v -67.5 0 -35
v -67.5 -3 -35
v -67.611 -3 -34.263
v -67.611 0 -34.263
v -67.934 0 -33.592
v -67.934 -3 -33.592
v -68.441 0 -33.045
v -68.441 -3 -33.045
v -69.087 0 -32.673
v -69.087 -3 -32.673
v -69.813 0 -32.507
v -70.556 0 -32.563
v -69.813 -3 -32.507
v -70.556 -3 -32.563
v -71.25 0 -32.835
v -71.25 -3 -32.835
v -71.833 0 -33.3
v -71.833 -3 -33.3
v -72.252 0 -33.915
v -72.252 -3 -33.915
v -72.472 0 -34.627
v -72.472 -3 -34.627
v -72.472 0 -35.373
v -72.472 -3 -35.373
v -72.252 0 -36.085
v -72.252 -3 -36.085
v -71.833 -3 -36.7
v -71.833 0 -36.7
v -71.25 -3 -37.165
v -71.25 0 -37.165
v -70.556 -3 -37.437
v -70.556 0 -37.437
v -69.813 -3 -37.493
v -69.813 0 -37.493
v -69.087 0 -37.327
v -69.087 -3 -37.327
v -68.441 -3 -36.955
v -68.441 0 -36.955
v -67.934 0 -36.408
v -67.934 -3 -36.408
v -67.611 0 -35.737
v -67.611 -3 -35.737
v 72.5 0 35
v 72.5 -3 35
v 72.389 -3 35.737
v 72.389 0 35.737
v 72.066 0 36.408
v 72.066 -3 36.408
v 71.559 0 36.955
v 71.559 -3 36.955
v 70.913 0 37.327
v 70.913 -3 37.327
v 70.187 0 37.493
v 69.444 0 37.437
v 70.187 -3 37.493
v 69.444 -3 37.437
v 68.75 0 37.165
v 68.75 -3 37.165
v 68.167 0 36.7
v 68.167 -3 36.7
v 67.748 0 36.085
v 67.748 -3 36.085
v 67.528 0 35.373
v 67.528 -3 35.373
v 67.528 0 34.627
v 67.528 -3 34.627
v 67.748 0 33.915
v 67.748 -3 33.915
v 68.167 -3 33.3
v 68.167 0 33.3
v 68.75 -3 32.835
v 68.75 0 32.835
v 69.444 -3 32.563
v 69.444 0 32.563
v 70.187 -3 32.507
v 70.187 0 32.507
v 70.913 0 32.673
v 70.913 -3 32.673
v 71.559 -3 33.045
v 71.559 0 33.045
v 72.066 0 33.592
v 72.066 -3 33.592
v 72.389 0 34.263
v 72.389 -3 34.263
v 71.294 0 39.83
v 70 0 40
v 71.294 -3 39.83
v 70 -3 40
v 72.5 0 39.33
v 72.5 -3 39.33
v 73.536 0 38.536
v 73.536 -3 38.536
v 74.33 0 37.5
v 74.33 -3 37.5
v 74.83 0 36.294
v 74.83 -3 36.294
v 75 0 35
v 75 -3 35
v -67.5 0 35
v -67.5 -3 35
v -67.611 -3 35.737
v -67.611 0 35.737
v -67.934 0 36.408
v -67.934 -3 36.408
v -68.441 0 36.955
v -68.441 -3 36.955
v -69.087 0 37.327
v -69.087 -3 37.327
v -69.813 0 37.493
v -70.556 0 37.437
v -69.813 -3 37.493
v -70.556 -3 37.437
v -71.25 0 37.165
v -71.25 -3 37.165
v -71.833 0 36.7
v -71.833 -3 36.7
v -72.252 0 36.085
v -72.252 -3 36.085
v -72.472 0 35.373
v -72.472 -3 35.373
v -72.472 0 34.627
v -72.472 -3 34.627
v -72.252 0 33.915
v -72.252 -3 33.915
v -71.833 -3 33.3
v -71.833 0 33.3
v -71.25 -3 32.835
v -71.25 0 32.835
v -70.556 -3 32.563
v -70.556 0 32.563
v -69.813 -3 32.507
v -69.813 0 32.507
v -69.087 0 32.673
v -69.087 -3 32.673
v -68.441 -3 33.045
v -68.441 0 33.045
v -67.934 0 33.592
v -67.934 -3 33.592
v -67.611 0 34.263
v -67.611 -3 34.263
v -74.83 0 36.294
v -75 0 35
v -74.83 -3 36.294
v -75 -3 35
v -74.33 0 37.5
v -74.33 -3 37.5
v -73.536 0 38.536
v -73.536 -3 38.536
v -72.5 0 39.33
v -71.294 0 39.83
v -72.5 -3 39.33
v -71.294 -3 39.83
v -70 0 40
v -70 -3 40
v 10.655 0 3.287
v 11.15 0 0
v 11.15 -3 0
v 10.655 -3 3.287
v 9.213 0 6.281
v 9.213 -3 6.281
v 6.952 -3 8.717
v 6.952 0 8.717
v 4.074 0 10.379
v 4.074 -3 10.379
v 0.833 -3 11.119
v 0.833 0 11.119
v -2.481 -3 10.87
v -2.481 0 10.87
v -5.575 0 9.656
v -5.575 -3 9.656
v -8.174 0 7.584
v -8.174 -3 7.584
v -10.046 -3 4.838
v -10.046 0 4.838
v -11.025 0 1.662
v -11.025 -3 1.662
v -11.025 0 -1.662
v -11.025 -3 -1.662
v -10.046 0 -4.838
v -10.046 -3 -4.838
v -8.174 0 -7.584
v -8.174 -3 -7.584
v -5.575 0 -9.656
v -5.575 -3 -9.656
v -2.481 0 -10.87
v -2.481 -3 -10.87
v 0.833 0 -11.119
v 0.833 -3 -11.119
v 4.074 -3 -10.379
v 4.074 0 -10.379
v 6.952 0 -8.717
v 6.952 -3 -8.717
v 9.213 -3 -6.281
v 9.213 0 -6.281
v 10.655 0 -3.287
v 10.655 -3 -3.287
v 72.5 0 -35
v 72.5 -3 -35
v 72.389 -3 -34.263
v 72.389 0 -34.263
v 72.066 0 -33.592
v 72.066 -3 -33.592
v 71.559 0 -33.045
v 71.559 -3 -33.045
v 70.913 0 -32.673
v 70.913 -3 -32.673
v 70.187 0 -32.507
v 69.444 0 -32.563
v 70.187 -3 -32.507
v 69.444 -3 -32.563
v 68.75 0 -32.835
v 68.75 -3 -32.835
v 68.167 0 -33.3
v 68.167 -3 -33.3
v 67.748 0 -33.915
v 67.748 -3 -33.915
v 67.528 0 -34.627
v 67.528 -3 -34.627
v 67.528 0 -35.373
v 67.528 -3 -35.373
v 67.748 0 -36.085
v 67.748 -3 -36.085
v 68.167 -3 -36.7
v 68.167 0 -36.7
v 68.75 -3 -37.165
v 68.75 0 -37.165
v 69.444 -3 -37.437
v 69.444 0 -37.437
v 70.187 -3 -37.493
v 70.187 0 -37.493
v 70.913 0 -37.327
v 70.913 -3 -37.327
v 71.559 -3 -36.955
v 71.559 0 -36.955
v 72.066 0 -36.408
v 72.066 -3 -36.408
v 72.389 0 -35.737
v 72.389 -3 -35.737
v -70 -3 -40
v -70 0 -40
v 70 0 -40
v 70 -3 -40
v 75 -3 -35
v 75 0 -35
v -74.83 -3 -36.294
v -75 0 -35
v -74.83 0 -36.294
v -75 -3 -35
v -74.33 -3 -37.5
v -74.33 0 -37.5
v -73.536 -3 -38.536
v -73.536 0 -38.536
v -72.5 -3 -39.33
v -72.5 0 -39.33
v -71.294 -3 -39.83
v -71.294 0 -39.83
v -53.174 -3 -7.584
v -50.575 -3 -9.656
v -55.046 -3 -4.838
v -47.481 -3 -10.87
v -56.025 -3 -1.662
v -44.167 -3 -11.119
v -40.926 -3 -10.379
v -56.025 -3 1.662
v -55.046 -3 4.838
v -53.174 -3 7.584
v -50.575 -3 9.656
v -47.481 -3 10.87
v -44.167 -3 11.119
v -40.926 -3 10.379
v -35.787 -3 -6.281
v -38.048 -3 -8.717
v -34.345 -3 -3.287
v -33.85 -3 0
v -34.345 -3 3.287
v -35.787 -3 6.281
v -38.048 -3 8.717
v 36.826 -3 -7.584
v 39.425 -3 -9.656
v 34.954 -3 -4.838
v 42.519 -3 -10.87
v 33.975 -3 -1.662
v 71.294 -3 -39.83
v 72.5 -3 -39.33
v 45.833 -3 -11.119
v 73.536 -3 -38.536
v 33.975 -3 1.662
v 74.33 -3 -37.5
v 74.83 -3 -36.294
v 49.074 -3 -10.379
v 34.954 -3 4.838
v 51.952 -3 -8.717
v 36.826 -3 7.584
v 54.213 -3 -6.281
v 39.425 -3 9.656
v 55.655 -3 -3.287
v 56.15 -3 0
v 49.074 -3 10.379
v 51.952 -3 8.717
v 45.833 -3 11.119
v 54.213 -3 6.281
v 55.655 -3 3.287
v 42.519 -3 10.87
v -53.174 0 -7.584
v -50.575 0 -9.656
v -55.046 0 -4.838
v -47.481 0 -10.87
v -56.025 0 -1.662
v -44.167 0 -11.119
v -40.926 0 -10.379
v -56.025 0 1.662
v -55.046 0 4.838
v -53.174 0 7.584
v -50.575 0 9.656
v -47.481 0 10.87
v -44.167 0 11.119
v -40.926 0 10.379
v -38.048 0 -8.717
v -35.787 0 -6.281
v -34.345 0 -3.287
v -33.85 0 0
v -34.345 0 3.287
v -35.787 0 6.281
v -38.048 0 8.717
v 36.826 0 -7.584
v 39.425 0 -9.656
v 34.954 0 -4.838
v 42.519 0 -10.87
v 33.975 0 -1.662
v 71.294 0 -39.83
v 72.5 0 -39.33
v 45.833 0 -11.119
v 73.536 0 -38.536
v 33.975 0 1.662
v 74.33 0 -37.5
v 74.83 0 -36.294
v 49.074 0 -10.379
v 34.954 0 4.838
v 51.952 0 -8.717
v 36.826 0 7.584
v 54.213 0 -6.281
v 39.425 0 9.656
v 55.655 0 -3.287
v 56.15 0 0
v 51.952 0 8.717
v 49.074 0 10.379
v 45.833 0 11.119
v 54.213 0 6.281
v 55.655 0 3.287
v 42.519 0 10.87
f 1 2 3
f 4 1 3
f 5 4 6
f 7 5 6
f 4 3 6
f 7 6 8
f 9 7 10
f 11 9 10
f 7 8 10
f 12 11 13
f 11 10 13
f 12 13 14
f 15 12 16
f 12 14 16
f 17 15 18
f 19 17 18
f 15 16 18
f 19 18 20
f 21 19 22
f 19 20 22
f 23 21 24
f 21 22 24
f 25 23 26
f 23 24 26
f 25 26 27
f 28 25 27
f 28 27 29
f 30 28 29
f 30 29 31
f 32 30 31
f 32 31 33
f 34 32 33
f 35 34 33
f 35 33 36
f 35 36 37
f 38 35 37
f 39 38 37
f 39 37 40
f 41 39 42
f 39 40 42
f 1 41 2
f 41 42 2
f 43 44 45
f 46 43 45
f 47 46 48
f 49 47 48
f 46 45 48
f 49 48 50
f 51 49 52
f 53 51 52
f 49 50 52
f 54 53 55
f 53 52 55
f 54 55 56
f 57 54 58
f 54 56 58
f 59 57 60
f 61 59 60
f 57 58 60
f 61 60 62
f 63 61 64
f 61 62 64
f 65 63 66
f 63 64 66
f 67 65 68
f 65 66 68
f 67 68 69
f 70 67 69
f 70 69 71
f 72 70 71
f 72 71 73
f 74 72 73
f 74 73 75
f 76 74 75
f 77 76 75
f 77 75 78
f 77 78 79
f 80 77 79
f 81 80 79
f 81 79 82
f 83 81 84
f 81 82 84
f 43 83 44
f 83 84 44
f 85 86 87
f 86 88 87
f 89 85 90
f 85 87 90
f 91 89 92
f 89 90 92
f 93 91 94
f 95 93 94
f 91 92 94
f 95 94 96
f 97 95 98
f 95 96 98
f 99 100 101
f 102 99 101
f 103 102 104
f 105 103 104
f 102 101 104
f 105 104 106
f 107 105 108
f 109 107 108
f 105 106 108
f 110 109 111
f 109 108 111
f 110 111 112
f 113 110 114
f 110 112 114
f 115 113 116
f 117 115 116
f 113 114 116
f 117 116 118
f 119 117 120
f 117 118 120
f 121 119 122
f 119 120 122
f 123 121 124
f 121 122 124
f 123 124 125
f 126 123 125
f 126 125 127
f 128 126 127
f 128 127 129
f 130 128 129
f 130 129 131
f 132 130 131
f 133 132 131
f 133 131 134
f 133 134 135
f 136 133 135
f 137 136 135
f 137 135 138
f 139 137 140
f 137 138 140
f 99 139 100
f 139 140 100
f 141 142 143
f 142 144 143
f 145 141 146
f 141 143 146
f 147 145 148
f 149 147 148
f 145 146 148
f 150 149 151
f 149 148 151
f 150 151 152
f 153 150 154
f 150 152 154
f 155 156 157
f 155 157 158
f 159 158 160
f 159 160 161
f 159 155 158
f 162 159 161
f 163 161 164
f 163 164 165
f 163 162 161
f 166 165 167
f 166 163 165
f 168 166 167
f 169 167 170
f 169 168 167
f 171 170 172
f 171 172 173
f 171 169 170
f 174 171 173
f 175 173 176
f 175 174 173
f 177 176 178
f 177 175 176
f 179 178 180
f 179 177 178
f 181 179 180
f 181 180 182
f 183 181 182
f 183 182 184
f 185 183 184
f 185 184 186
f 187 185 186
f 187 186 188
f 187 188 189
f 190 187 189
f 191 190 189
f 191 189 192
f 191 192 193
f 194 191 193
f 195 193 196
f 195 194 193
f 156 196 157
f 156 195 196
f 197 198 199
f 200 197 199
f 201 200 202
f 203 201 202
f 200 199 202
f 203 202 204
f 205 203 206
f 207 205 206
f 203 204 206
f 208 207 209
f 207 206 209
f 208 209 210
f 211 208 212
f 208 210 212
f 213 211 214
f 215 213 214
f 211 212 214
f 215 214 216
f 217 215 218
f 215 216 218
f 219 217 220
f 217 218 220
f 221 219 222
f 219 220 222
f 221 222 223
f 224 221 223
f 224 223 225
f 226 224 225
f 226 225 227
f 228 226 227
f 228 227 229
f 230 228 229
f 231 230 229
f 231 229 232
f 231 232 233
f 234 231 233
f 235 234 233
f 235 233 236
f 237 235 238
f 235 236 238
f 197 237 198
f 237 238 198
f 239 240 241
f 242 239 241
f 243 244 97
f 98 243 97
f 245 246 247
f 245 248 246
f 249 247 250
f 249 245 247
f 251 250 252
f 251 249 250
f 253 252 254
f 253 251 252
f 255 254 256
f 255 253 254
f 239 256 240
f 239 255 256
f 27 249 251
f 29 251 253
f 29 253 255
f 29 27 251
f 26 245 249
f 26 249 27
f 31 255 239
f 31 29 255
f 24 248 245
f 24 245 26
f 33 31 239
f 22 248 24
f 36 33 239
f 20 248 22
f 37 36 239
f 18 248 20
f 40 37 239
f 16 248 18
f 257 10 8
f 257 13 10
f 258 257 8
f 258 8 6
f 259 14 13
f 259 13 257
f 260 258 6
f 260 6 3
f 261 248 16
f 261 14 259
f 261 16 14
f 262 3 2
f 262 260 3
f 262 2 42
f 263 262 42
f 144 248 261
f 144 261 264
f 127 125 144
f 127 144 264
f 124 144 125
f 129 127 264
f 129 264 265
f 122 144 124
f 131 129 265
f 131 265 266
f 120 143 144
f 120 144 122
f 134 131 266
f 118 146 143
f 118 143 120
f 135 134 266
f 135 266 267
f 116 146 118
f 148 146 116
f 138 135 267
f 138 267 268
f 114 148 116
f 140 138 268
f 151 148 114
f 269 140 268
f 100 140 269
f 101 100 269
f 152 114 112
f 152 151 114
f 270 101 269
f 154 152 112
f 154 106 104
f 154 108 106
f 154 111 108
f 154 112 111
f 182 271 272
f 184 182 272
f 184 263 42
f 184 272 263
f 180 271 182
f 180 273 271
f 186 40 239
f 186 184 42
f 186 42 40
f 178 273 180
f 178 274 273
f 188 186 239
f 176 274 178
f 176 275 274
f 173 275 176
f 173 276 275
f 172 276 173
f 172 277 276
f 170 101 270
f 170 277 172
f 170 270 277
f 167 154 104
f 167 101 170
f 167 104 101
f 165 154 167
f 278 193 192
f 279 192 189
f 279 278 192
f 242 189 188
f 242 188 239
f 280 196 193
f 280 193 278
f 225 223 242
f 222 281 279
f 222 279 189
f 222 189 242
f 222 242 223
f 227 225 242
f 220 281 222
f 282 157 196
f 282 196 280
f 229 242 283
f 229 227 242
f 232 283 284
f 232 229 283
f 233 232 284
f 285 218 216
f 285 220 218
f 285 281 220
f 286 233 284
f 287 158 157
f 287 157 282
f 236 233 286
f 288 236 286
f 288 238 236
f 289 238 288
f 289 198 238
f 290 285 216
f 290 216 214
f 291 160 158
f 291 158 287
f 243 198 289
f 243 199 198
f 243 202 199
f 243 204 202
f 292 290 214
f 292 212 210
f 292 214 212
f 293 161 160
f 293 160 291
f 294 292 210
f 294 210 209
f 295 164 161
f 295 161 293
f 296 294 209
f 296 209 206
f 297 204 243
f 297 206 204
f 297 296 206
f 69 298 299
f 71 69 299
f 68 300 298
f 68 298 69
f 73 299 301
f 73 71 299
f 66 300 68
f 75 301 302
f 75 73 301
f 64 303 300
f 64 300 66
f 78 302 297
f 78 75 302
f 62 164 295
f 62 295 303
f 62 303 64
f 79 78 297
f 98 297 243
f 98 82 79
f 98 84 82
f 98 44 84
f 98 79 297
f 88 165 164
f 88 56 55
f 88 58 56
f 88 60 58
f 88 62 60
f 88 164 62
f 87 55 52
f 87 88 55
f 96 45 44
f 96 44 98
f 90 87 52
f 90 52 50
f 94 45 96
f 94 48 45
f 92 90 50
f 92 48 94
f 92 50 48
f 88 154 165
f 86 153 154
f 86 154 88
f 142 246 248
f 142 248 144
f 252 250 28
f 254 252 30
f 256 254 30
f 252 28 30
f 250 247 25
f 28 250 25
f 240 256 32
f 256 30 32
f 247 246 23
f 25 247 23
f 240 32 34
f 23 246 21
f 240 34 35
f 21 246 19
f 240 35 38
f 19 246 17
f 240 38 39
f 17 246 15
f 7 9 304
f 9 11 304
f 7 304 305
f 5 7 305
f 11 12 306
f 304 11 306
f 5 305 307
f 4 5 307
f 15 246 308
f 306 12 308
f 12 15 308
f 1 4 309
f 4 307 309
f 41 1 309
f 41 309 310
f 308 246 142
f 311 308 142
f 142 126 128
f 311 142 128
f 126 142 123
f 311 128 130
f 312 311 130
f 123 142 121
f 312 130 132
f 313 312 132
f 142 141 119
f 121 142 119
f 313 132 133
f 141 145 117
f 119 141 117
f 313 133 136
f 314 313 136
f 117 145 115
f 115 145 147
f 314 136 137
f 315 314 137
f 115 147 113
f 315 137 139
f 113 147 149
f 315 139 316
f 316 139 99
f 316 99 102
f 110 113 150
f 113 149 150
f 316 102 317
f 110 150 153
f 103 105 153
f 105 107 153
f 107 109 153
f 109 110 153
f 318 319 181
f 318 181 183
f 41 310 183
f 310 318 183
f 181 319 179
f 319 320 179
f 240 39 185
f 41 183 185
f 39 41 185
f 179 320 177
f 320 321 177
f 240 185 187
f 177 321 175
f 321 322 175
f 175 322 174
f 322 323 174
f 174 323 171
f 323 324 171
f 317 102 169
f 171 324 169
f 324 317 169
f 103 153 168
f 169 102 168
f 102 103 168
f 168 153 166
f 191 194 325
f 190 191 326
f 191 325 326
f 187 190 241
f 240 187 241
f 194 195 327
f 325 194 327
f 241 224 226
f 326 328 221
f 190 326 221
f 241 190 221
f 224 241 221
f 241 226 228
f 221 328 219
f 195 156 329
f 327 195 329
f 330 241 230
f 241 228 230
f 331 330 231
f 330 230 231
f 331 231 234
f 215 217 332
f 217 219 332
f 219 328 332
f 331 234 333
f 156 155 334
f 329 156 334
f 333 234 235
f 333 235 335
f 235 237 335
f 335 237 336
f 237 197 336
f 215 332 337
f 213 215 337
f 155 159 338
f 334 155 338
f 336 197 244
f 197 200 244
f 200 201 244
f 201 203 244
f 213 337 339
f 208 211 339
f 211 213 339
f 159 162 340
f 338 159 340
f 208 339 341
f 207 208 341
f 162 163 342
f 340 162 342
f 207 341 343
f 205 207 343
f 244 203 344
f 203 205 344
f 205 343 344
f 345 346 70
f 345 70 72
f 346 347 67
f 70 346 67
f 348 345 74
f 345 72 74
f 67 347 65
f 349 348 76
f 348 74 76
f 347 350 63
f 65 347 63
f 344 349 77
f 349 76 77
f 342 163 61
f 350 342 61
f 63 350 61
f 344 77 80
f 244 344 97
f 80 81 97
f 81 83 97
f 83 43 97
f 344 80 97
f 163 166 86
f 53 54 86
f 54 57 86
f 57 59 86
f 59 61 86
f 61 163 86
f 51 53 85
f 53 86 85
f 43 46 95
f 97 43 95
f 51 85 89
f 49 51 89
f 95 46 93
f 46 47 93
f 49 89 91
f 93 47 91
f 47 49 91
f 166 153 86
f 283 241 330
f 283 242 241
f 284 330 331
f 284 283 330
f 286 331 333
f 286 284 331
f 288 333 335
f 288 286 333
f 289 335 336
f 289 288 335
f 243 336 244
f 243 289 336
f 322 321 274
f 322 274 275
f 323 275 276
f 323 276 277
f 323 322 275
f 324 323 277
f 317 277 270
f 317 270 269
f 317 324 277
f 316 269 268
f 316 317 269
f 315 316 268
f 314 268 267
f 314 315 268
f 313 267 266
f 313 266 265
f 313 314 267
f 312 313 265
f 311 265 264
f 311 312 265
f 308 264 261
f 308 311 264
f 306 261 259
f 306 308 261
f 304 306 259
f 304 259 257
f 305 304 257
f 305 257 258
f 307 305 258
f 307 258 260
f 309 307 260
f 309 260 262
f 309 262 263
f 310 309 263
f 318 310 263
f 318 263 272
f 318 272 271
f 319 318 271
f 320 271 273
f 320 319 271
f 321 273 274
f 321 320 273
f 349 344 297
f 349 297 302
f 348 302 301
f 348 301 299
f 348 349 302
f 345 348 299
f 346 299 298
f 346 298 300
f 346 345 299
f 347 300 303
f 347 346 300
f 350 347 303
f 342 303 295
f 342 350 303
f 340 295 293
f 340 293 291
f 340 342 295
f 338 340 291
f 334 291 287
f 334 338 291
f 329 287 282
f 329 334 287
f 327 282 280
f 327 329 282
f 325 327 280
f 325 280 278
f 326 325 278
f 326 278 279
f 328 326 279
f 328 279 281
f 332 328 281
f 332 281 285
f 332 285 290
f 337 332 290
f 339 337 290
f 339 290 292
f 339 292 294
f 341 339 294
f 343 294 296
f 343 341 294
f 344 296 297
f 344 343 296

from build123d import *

# Parameters (mm, degrees)
F0_W     = 150
F0_H     = 80
F0_R     = 11.15
F1_DEPTH = 3
F2_R     = 2.5
F3_DEPTH = 3
F4_R     = 5


with BuildPart() as f1:
    # F0 (on Front) → F1 (new body)
    with BuildSketch(Plane.XZ):
        Rectangle(F0_W, F0_H)
        with Locations((-45, 0)):
            Circle(F0_R, mode=Mode.SUBTRACT)
        Circle(F0_R, mode=Mode.SUBTRACT)
        with Locations((45, 0)):
            Circle(F0_R, mode=Mode.SUBTRACT)
    extrude(amount=F1_DEPTH)

    # F2 (on face) → F3 (cut, through all)
    with BuildSketch(Plane.XZ.offset(3)):
        with Locations((-70, 35)):
            Circle(F2_R)
        with Locations((70, 35)):
            Circle(F2_R)
        with Locations((70, -35)):
            Circle(F2_R)
        with Locations((-70, -35)):
            Circle(F2_R)
    extrude(amount=-F3_DEPTH, mode=Mode.SUBTRACT)

    # F4
    f4_edges = [f1.edges().sort_by_distance(p)[0] for p in [
        (-75, -1.5, 40),
        (75, -1.5, 40),
        (75, -1.5, -40),
        (-75, -1.5, -40),
    ]]
    fillet(f4_edges, radius=F4_R)


solid = f1.part
